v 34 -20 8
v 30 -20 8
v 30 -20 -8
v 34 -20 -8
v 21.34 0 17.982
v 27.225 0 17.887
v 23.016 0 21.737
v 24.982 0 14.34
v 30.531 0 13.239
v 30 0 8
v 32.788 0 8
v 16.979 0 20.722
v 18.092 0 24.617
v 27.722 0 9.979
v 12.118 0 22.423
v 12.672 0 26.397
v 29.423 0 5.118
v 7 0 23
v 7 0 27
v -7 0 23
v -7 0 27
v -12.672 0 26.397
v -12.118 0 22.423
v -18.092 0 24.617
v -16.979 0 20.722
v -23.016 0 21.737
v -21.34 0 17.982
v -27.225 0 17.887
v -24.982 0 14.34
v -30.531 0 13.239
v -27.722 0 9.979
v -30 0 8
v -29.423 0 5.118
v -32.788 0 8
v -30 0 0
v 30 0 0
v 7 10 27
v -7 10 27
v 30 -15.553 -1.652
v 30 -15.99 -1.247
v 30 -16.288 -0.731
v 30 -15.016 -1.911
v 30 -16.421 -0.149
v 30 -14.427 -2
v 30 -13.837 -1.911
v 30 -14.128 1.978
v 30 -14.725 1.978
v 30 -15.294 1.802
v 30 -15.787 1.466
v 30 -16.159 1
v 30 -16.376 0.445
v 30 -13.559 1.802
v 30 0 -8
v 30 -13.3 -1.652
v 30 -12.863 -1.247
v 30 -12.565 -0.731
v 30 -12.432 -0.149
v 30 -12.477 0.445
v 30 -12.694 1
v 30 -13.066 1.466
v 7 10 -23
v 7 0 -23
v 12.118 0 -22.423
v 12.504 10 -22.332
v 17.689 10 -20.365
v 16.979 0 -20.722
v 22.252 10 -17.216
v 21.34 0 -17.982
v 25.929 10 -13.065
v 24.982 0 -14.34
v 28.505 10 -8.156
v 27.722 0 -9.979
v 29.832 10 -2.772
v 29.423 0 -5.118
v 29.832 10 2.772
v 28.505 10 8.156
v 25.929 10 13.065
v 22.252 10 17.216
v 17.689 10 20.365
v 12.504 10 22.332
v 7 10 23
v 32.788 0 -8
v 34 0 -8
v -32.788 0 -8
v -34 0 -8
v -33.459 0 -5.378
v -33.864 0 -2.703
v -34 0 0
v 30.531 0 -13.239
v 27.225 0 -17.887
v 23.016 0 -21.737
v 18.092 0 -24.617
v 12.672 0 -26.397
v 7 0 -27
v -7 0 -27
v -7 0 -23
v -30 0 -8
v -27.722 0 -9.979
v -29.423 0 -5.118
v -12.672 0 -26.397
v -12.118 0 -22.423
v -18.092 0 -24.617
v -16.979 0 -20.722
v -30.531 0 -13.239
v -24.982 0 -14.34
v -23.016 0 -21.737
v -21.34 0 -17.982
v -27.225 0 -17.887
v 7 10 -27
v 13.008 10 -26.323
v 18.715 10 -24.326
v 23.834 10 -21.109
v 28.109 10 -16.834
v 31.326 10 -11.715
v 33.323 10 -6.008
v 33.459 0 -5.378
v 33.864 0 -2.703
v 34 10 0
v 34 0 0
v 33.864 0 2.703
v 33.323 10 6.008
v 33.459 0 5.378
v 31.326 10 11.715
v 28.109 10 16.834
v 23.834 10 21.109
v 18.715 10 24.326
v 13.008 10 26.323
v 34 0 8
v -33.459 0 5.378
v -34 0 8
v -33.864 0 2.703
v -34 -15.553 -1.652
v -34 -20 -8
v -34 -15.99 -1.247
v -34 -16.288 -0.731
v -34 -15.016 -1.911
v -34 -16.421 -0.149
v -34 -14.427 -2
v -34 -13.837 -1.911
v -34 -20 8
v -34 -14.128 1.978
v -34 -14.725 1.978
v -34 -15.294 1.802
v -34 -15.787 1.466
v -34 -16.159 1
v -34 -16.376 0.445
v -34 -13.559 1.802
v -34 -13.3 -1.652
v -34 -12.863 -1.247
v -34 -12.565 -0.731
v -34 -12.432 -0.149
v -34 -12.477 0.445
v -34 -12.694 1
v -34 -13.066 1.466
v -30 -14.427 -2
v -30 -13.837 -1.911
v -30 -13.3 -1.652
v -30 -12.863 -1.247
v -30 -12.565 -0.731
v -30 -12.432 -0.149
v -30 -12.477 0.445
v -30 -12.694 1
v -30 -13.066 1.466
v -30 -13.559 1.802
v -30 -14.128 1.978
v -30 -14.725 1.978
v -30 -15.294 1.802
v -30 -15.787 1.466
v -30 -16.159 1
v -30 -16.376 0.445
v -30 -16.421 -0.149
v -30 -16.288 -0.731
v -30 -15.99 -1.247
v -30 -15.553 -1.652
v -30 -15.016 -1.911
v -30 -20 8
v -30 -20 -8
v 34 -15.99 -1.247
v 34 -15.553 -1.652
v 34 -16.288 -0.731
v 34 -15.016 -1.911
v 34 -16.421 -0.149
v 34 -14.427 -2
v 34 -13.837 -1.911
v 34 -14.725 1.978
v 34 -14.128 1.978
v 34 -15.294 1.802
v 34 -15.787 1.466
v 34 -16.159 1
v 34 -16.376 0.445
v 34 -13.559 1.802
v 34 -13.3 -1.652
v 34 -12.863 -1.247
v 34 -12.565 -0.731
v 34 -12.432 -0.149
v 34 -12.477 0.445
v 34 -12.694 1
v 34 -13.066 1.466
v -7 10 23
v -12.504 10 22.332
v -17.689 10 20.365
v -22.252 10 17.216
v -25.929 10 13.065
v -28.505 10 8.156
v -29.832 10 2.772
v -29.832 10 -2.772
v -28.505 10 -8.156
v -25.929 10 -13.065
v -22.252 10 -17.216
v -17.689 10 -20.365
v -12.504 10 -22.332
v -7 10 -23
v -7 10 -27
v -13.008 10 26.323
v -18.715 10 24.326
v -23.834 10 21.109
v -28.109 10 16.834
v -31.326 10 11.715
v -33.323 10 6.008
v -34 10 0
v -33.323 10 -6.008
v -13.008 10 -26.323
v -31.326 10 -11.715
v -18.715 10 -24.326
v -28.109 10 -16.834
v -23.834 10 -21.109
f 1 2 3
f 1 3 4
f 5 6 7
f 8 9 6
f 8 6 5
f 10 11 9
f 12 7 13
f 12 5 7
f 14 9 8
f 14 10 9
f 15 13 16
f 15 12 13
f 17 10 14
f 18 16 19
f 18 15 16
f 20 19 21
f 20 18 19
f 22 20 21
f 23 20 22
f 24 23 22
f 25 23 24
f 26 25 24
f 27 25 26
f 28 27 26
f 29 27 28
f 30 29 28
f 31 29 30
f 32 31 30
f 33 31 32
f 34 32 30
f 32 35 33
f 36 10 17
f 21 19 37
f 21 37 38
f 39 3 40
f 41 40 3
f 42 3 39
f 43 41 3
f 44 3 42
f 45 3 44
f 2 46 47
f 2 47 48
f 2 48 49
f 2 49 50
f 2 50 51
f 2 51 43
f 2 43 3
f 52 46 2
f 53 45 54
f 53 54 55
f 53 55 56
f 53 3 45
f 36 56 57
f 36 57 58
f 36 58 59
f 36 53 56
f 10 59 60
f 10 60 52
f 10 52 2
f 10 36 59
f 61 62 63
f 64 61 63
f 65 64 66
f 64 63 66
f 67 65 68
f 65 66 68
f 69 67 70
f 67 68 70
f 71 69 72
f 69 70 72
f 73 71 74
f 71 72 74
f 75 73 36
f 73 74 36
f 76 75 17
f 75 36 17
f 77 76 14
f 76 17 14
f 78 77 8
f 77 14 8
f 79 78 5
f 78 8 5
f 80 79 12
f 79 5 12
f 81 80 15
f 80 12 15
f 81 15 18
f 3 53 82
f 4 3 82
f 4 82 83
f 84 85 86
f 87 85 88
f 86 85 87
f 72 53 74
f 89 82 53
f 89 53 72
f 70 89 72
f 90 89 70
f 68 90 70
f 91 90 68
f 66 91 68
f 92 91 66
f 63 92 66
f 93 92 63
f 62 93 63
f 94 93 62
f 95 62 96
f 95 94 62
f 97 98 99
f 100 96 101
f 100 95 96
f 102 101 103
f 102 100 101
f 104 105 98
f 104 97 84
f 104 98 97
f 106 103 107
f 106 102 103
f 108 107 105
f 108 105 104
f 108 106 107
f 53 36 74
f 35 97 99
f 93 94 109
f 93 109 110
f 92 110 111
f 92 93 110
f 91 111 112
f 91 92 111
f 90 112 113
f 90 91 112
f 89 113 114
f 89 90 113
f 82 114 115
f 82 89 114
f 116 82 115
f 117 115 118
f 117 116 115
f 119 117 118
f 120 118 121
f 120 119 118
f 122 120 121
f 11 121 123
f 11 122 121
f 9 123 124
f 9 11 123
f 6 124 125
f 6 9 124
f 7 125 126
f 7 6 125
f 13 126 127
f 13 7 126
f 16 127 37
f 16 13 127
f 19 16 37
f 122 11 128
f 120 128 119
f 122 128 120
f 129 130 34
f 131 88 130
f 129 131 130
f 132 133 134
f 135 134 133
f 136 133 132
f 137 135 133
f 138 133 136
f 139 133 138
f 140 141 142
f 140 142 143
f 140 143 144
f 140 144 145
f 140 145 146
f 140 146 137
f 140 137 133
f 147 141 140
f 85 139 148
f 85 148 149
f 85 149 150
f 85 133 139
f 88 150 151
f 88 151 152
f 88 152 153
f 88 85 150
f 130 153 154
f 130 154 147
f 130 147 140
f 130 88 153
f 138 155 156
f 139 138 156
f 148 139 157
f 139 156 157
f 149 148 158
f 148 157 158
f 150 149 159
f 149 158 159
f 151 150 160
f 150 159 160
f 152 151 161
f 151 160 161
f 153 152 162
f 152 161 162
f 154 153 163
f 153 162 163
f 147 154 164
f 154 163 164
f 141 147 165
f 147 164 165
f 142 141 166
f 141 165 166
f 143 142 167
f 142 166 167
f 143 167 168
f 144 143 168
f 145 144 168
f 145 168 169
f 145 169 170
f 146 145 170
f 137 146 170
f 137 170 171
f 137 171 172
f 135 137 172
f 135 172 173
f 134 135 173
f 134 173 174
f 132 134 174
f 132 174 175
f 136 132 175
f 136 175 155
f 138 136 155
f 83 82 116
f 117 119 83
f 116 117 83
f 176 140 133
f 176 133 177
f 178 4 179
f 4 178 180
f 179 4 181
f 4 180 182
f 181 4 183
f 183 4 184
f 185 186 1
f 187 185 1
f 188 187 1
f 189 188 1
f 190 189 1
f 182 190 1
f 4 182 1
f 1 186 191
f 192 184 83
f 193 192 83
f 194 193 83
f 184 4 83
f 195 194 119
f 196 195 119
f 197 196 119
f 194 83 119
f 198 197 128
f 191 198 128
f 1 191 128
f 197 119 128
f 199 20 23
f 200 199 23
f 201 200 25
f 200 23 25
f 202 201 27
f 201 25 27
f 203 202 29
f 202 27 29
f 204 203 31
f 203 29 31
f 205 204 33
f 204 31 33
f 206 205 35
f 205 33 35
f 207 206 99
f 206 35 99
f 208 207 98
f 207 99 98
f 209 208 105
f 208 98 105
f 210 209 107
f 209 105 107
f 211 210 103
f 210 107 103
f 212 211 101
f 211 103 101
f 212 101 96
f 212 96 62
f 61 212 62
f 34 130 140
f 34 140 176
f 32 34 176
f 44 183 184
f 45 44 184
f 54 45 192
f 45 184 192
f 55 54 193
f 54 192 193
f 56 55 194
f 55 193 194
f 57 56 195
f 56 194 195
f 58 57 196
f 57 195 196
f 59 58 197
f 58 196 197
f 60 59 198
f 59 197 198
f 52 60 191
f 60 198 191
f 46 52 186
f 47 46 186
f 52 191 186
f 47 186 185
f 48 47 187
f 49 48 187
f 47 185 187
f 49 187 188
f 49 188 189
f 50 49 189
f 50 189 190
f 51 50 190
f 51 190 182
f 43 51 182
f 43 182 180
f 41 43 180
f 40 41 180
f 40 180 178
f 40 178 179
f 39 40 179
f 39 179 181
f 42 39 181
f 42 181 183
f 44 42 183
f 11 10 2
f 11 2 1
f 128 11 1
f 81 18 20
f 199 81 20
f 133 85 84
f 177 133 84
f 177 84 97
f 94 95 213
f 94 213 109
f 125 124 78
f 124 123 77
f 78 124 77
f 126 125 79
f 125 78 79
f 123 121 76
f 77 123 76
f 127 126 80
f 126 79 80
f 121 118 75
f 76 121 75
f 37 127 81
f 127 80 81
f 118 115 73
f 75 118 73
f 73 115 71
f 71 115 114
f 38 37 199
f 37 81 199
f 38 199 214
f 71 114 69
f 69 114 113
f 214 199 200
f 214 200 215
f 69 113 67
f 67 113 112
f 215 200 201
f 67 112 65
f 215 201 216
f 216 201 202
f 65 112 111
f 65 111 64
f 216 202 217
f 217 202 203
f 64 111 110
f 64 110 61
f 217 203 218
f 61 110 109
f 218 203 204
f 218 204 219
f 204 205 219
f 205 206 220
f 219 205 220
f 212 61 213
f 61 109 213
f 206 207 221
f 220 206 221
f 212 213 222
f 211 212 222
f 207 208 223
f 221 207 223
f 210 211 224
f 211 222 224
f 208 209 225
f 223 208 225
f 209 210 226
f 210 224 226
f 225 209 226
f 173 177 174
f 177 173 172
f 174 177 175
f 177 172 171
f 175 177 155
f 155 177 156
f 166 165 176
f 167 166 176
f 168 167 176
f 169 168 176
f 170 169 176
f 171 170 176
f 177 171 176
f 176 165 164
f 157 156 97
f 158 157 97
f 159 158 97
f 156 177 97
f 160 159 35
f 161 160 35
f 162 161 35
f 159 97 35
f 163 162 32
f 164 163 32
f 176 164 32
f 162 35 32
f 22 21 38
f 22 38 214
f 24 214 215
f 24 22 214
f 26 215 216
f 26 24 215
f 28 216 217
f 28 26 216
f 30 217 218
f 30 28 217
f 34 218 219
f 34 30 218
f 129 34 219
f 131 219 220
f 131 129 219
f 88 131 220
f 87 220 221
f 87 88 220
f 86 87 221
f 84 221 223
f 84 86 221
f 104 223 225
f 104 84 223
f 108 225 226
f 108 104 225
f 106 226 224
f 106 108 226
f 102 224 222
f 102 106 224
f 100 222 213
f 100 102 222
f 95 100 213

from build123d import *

# Parameters (mm, degrees)
EXTRUDE_1_DEPTH     = 10
SKETCH_3_W          = 4
SKETCH_3_H          = 16
EXTRUDE_2_DEPTH     = 20
SKETCH_5_R          = 2
CUT_EXTRUDE_2_DEPTH = 69


with BuildPart() as part:
    # 草图2 → 凸台-拉伸1 (new body)
    with BuildSketch(Plane(origin=(0, 0, 0), x_dir=(1, 0, 0), z_dir=(0, 1, 0))):
        with BuildLine():
            Line((-7, 27), (7, 27))
            ThreePointArc((7, 27), (34, 0), (7, -27))
            Line((7, -27), (-7, -27))
            ThreePointArc((-7, -27), (-34, 0), (-7, 27))
        make_face()
        with BuildLine():
            Line((-7, 23), (7, 23))
            ThreePointArc((7, 23), (30, 0), (7, -23))
            Line((7, -23), (-7, -23))
            ThreePointArc((-7, -23), (-30, 0), (-7, 23))
        make_face(mode=Mode.SUBTRACT)
    extrude(amount=EXTRUDE_1_DEPTH)

    # 草图3 → 凸台-拉伸2 (add)
    with BuildSketch(Plane.XZ):
        with Locations((-32, 0)):
            Rectangle(SKETCH_3_W, SKETCH_3_H)
        with Locations((32, 0)):
            Rectangle(SKETCH_3_W, SKETCH_3_H)
    extrude(amount=EXTRUDE_2_DEPTH)

    # 草图5 → 切除-拉伸2 (cut, through all)
    with BuildSketch(Plane(origin=(34, 0, 0), x_dir=(0, 0, -1), z_dir=(1, 0, 0))):
        with Locations((0, -14.426533044)):
            Circle(SKETCH_5_R)
    extrude(amount=-CUT_EXTRUDE_2_DEPTH, mode=Mode.SUBTRACT)


solid = part.part
